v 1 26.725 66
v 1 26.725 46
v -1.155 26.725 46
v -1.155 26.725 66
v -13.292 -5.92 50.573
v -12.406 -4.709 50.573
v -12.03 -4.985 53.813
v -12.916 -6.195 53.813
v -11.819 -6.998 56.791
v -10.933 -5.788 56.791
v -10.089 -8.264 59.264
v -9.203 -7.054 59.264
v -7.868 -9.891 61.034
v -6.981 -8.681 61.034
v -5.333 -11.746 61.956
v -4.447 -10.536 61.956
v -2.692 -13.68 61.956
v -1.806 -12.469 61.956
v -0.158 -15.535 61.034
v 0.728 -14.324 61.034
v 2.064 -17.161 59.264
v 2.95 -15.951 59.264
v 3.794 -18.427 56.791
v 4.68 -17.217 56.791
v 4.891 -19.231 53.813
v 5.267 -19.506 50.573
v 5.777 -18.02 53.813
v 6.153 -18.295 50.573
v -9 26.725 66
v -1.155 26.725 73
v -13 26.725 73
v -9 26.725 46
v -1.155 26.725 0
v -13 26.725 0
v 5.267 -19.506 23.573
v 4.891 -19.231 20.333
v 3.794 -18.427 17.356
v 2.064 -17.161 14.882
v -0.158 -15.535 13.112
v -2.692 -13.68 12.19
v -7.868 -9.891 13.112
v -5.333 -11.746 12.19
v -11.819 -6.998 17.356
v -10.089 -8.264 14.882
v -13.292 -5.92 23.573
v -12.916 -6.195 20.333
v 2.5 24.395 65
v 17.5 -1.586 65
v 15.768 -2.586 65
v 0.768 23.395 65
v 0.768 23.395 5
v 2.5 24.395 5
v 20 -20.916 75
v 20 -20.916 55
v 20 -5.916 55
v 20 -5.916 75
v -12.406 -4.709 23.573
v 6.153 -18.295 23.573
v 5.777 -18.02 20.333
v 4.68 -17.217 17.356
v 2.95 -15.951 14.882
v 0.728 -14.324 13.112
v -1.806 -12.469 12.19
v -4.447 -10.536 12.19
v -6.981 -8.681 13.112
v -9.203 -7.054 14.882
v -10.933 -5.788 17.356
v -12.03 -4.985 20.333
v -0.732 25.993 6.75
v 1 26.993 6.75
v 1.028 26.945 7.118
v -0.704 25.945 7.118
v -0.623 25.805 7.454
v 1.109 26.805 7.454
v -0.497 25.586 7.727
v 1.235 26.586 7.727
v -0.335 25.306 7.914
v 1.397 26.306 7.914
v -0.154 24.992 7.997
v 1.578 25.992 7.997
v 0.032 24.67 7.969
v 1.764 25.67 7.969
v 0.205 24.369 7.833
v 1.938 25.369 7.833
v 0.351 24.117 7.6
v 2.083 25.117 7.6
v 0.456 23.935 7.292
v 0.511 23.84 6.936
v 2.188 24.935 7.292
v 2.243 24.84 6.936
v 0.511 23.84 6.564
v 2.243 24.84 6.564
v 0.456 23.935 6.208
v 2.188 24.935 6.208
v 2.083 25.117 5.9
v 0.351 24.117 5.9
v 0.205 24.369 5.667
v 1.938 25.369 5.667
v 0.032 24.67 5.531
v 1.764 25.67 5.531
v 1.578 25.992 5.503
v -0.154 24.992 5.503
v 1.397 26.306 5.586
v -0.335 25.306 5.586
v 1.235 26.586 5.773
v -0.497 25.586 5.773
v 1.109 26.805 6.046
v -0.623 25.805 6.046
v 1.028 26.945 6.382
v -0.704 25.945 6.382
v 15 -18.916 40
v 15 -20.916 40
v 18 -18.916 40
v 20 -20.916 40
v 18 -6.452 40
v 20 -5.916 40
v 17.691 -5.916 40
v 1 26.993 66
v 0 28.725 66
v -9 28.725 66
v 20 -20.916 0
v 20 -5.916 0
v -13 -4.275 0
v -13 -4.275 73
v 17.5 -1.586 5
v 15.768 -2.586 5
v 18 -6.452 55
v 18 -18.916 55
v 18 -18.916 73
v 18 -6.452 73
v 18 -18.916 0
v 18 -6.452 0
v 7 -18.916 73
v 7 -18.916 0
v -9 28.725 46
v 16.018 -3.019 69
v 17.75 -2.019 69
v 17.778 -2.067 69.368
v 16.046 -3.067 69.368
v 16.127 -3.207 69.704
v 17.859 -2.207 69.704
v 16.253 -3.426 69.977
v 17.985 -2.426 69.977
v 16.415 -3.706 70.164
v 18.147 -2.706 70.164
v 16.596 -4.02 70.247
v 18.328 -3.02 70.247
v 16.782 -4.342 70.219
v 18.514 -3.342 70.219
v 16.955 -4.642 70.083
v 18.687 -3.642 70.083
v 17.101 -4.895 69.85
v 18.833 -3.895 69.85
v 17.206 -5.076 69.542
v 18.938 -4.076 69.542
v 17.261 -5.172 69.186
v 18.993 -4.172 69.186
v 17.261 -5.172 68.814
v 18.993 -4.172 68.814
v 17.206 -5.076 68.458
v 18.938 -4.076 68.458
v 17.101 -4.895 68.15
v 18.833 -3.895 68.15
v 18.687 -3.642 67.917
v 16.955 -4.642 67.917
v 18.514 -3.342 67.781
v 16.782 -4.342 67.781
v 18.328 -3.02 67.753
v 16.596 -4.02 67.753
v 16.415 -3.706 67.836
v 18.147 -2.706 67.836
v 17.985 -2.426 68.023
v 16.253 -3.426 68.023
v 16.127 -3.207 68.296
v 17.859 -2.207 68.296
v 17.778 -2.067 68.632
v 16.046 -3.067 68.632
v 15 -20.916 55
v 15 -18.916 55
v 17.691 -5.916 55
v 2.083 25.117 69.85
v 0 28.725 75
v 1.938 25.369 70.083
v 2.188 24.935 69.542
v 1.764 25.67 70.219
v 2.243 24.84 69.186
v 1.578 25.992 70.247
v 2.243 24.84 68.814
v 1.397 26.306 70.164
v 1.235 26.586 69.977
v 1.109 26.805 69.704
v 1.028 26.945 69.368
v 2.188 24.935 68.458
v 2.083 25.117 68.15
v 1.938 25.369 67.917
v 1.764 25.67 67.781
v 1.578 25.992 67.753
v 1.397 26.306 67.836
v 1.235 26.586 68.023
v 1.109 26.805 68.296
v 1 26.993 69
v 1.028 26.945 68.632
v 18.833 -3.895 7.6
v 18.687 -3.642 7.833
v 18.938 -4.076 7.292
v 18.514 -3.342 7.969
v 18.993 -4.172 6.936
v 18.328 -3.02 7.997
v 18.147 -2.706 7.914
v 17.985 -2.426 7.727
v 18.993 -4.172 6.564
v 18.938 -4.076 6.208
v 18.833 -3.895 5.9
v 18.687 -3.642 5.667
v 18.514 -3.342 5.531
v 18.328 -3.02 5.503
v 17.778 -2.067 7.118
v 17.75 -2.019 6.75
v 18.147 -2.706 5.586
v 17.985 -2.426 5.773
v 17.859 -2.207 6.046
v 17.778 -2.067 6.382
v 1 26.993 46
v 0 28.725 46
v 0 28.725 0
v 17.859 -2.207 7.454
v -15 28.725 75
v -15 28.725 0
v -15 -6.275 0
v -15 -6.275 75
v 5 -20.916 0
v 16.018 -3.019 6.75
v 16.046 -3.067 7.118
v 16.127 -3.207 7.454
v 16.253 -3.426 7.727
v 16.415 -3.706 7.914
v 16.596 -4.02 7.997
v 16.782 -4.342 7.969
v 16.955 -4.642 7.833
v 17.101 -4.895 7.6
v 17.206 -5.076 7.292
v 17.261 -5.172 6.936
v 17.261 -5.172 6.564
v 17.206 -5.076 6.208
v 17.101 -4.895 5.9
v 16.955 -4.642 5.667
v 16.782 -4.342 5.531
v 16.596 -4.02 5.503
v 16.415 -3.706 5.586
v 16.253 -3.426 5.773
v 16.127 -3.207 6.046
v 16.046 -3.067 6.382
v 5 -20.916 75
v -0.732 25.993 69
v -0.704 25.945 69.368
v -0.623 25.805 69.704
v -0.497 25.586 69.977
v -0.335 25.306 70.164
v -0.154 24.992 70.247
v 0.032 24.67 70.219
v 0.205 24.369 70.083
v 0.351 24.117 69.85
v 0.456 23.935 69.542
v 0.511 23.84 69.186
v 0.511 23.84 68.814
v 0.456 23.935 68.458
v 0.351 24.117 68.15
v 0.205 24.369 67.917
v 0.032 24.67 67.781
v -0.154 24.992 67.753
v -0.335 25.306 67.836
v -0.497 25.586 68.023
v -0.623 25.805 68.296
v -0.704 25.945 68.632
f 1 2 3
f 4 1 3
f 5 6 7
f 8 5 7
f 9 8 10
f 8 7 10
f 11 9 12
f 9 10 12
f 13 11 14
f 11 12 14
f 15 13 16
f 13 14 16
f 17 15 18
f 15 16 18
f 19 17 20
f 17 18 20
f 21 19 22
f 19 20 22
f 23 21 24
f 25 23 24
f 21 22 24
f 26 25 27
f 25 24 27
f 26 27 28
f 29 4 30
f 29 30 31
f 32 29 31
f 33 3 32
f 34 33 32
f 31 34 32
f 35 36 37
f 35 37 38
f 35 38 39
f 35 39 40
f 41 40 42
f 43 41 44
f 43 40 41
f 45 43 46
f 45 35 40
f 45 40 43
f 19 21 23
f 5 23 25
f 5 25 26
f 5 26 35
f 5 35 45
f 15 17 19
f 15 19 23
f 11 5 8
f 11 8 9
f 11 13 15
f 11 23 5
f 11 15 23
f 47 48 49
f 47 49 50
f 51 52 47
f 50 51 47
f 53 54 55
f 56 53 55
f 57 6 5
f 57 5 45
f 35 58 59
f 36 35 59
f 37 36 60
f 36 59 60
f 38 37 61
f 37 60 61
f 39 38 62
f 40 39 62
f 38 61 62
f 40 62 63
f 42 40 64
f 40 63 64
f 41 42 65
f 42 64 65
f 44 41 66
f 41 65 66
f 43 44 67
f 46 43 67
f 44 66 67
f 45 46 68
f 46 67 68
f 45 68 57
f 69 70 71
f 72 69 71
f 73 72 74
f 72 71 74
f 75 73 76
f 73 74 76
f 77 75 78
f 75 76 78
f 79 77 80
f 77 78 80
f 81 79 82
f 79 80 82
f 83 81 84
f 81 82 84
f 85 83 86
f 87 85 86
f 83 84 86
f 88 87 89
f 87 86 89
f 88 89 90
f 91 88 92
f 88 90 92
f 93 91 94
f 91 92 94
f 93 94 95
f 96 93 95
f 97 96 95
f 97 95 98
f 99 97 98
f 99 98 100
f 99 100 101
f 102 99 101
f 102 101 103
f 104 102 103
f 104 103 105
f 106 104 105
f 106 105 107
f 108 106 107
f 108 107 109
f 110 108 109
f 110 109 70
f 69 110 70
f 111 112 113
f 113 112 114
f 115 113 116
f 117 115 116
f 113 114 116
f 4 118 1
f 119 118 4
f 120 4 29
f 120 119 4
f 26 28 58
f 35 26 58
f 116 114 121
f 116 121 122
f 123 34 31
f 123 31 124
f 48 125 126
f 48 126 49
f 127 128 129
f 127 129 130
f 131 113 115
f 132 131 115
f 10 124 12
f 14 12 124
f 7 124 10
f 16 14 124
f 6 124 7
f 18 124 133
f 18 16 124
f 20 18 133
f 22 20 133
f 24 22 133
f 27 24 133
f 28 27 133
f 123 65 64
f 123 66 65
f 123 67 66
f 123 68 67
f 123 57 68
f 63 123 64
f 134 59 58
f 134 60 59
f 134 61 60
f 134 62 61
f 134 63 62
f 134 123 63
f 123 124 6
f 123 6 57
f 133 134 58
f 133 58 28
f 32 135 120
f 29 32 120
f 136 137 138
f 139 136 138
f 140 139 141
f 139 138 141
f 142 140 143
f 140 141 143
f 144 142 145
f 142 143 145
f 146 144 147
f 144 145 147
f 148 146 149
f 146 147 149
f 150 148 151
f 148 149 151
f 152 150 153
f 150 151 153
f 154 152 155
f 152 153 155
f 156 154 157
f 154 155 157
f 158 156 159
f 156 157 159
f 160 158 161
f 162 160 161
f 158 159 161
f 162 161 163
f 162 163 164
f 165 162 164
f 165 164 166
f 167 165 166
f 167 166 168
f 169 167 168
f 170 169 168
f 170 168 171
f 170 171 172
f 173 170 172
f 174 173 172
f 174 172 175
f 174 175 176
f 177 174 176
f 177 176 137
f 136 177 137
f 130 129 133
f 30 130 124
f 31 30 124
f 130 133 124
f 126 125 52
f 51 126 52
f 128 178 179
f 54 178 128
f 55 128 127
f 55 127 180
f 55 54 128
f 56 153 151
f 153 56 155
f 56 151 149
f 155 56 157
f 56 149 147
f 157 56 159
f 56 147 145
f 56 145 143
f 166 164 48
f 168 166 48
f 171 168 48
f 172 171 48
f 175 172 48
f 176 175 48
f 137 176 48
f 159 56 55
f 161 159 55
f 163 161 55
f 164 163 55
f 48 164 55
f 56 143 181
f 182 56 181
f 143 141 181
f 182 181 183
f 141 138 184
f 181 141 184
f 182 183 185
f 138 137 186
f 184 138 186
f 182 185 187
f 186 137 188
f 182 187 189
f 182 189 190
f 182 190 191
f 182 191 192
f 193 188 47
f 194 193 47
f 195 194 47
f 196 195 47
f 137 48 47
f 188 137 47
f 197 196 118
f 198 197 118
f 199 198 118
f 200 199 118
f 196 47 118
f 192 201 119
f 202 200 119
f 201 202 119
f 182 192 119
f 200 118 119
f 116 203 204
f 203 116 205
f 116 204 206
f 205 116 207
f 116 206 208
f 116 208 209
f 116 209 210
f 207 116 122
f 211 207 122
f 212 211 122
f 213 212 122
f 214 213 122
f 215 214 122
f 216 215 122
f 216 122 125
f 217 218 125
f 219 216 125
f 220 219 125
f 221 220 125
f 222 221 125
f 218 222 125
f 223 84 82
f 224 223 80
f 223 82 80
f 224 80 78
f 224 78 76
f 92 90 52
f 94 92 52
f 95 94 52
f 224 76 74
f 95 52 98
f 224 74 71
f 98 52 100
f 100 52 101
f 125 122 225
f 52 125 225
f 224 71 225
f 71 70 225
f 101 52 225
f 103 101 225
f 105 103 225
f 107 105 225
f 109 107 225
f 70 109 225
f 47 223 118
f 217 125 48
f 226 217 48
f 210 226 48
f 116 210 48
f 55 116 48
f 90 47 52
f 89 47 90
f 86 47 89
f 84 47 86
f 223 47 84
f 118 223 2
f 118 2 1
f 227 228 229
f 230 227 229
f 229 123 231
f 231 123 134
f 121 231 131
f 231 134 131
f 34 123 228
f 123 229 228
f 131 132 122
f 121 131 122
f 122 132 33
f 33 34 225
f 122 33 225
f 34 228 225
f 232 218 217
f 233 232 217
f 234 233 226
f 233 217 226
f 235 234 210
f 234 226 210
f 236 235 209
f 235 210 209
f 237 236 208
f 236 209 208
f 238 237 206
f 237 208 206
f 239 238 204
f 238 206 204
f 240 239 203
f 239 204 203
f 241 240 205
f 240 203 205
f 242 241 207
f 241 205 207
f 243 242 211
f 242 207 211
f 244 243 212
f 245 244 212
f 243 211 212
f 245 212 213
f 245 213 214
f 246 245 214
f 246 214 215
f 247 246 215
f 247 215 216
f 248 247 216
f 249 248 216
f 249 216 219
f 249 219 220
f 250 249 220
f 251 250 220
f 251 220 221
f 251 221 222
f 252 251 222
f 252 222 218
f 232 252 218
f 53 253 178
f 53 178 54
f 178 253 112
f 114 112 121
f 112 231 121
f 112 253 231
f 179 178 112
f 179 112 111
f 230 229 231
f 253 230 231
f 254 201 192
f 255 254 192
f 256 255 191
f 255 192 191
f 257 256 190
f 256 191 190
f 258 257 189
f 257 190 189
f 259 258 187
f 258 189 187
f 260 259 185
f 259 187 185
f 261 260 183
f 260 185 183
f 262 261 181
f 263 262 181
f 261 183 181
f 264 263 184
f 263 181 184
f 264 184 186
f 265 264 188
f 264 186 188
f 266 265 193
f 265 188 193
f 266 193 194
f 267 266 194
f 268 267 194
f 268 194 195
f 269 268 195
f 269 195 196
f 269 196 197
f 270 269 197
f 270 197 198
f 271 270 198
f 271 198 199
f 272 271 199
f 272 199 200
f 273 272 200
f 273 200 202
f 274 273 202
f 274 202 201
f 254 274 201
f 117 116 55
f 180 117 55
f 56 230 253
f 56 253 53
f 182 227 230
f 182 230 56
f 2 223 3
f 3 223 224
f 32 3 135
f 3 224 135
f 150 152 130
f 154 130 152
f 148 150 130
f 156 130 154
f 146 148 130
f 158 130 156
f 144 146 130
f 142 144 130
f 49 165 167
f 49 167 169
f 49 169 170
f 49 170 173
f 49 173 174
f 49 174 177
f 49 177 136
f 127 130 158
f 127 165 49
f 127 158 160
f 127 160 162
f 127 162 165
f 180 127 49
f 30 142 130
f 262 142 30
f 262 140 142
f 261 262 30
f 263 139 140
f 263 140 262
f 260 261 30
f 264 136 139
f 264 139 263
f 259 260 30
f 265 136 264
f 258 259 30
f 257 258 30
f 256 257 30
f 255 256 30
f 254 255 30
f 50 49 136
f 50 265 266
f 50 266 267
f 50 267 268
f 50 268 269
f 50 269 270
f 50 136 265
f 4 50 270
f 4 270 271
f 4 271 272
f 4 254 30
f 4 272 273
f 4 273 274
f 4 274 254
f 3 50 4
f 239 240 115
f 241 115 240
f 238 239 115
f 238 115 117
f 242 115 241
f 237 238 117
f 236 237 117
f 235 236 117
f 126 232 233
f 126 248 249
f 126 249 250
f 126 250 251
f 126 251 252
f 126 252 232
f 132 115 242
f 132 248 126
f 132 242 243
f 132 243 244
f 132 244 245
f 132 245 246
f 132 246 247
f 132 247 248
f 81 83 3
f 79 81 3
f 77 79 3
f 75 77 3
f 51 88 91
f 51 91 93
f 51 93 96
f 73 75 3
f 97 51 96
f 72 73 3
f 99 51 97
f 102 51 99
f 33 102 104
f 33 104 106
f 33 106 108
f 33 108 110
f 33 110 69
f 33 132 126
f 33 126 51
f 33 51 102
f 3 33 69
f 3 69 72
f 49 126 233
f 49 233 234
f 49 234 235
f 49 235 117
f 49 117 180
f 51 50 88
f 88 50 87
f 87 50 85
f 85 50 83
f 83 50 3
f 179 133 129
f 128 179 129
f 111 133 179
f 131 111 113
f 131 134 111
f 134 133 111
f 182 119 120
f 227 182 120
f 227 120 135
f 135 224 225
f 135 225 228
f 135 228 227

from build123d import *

# Parameters (mm, degrees)
PAD_DEPTH       = 75
POCKET_DEPTH    = 73
SKETCH002_R     = 1.25
SKETCH002_W     = 30
SKETCH002_H     = 60
POCKET001_DEPTH = 5
SKETCH005_W     = 10
SKETCH005_H     = 20
POCKET002_DEPTH = 2
SKETCH004_W     = 15
SKETCH004_H     = 15
POCKET003_DEPTH = 5
POCKET004_DEPTH = 1.5


with BuildPart() as part:
    # Sketch → Pad (new body)
    with BuildSketch(Plane.XY):
        Polygon((-15, 28.7253277197), (-15, -6.2746722803), (5, -20.9156884317), (20, -20.9156884317), (20, -5.9156884317), (0, 28.7253277197), align=None)
    extrude(amount=PAD_DEPTH)

    # Sketch001 (on Face7 of Pad) → Pocket (cut)
    with BuildSketch(Plane(origin=(0, 0, 0), x_dir=(1, 0, 0), z_dir=(0, 0, -1))):
        Polygon((-13, 4.2746722803), (7, 18.9156884317), (18, 18.9156884317), (18, 6.4515868166), (-1.1547005384, -26.7253277197), (-13, -26.7253277197), align=None)
    extrude(amount=-POCKET_DEPTH, mode=Mode.SUBTRACT)

    # Sketch002 (on Face6 of Pocket) → Pocket001 (cut)
    with BuildSketch(Plane(origin=(12.4384317686, 7.1813319299, 0), x_dir=(-0.5, 0.8660254038, 0), z_dir=(0.8660254038, 0.5, 0))):
        with Locations((-11.8731364627, 69)):
            Circle(SKETCH002_R)
        with Locations((21.6268635373, 6.75)):
            Circle(SKETCH002_R)
        with Locations((-11.8731364627, 6.75)):
            Circle(SKETCH002_R)
        with Locations((21.6268635373, 69)):
            Circle(SKETCH002_R)
        with Locations((4.8768635373, 35)):
            Rectangle(SKETCH002_W, SKETCH002_H)
    extrude(amount=-POCKET001_DEPTH, mode=Mode.SUBTRACT)

    # Sketch005 (on Face2 of Pocket001) → Pocket002 (cut)
    with BuildSketch(Plane(origin=(0, 28.7253277197, 0), x_dir=(-1, 0, 0), z_dir=(0, 1, 0))):
        with Locations((4, 56)):
            Rectangle(SKETCH005_W, SKETCH005_H)
    extrude(amount=-POCKET002_DEPTH, mode=Mode.SUBTRACT)

    # Sketch004 (on Face8 of Pocket001) → Pocket003 (cut)
    with BuildSketch(Plane.YZ.offset(20)):
        with Locations((-13.4156884317, 47.5)):
            Rectangle(SKETCH004_W, SKETCH004_H)
    extrude(amount=-POCKET003_DEPTH, mode=Mode.SUBTRACT)

    # Sketch006 (on Face12 of Pocket003) → Pocket004 (cut)
    with BuildSketch(Plane(origin=(-6.5733230776, -8.9793263113, 0), x_dir=(-0.8068982214, 0.5906904946, 0), z_dir=(0.5906904946, 0.8068982214, 0))):
        with BuildLine():
            ThreePointArc((7.2285743414, 50.5731403336), (-4.2714256586, 62.0731403336), (-15.7714256586, 50.5731403336))
            Line((-15.7714256586, 50.5731403336), (-15.7714256586, 23.5731403336))
            ThreePointArc((-15.7714256586, 23.5731403336), (-4.2714256586, 12.0731403336), (7.2285743414, 23.5731403336))
            Line((7.2285743414, 50.5731403336), (7.2285743414, 23.5731403336))
        make_face()
    extrude(amount=-POCKET004_DEPTH, mode=Mode.SUBTRACT)


solid = part.part
